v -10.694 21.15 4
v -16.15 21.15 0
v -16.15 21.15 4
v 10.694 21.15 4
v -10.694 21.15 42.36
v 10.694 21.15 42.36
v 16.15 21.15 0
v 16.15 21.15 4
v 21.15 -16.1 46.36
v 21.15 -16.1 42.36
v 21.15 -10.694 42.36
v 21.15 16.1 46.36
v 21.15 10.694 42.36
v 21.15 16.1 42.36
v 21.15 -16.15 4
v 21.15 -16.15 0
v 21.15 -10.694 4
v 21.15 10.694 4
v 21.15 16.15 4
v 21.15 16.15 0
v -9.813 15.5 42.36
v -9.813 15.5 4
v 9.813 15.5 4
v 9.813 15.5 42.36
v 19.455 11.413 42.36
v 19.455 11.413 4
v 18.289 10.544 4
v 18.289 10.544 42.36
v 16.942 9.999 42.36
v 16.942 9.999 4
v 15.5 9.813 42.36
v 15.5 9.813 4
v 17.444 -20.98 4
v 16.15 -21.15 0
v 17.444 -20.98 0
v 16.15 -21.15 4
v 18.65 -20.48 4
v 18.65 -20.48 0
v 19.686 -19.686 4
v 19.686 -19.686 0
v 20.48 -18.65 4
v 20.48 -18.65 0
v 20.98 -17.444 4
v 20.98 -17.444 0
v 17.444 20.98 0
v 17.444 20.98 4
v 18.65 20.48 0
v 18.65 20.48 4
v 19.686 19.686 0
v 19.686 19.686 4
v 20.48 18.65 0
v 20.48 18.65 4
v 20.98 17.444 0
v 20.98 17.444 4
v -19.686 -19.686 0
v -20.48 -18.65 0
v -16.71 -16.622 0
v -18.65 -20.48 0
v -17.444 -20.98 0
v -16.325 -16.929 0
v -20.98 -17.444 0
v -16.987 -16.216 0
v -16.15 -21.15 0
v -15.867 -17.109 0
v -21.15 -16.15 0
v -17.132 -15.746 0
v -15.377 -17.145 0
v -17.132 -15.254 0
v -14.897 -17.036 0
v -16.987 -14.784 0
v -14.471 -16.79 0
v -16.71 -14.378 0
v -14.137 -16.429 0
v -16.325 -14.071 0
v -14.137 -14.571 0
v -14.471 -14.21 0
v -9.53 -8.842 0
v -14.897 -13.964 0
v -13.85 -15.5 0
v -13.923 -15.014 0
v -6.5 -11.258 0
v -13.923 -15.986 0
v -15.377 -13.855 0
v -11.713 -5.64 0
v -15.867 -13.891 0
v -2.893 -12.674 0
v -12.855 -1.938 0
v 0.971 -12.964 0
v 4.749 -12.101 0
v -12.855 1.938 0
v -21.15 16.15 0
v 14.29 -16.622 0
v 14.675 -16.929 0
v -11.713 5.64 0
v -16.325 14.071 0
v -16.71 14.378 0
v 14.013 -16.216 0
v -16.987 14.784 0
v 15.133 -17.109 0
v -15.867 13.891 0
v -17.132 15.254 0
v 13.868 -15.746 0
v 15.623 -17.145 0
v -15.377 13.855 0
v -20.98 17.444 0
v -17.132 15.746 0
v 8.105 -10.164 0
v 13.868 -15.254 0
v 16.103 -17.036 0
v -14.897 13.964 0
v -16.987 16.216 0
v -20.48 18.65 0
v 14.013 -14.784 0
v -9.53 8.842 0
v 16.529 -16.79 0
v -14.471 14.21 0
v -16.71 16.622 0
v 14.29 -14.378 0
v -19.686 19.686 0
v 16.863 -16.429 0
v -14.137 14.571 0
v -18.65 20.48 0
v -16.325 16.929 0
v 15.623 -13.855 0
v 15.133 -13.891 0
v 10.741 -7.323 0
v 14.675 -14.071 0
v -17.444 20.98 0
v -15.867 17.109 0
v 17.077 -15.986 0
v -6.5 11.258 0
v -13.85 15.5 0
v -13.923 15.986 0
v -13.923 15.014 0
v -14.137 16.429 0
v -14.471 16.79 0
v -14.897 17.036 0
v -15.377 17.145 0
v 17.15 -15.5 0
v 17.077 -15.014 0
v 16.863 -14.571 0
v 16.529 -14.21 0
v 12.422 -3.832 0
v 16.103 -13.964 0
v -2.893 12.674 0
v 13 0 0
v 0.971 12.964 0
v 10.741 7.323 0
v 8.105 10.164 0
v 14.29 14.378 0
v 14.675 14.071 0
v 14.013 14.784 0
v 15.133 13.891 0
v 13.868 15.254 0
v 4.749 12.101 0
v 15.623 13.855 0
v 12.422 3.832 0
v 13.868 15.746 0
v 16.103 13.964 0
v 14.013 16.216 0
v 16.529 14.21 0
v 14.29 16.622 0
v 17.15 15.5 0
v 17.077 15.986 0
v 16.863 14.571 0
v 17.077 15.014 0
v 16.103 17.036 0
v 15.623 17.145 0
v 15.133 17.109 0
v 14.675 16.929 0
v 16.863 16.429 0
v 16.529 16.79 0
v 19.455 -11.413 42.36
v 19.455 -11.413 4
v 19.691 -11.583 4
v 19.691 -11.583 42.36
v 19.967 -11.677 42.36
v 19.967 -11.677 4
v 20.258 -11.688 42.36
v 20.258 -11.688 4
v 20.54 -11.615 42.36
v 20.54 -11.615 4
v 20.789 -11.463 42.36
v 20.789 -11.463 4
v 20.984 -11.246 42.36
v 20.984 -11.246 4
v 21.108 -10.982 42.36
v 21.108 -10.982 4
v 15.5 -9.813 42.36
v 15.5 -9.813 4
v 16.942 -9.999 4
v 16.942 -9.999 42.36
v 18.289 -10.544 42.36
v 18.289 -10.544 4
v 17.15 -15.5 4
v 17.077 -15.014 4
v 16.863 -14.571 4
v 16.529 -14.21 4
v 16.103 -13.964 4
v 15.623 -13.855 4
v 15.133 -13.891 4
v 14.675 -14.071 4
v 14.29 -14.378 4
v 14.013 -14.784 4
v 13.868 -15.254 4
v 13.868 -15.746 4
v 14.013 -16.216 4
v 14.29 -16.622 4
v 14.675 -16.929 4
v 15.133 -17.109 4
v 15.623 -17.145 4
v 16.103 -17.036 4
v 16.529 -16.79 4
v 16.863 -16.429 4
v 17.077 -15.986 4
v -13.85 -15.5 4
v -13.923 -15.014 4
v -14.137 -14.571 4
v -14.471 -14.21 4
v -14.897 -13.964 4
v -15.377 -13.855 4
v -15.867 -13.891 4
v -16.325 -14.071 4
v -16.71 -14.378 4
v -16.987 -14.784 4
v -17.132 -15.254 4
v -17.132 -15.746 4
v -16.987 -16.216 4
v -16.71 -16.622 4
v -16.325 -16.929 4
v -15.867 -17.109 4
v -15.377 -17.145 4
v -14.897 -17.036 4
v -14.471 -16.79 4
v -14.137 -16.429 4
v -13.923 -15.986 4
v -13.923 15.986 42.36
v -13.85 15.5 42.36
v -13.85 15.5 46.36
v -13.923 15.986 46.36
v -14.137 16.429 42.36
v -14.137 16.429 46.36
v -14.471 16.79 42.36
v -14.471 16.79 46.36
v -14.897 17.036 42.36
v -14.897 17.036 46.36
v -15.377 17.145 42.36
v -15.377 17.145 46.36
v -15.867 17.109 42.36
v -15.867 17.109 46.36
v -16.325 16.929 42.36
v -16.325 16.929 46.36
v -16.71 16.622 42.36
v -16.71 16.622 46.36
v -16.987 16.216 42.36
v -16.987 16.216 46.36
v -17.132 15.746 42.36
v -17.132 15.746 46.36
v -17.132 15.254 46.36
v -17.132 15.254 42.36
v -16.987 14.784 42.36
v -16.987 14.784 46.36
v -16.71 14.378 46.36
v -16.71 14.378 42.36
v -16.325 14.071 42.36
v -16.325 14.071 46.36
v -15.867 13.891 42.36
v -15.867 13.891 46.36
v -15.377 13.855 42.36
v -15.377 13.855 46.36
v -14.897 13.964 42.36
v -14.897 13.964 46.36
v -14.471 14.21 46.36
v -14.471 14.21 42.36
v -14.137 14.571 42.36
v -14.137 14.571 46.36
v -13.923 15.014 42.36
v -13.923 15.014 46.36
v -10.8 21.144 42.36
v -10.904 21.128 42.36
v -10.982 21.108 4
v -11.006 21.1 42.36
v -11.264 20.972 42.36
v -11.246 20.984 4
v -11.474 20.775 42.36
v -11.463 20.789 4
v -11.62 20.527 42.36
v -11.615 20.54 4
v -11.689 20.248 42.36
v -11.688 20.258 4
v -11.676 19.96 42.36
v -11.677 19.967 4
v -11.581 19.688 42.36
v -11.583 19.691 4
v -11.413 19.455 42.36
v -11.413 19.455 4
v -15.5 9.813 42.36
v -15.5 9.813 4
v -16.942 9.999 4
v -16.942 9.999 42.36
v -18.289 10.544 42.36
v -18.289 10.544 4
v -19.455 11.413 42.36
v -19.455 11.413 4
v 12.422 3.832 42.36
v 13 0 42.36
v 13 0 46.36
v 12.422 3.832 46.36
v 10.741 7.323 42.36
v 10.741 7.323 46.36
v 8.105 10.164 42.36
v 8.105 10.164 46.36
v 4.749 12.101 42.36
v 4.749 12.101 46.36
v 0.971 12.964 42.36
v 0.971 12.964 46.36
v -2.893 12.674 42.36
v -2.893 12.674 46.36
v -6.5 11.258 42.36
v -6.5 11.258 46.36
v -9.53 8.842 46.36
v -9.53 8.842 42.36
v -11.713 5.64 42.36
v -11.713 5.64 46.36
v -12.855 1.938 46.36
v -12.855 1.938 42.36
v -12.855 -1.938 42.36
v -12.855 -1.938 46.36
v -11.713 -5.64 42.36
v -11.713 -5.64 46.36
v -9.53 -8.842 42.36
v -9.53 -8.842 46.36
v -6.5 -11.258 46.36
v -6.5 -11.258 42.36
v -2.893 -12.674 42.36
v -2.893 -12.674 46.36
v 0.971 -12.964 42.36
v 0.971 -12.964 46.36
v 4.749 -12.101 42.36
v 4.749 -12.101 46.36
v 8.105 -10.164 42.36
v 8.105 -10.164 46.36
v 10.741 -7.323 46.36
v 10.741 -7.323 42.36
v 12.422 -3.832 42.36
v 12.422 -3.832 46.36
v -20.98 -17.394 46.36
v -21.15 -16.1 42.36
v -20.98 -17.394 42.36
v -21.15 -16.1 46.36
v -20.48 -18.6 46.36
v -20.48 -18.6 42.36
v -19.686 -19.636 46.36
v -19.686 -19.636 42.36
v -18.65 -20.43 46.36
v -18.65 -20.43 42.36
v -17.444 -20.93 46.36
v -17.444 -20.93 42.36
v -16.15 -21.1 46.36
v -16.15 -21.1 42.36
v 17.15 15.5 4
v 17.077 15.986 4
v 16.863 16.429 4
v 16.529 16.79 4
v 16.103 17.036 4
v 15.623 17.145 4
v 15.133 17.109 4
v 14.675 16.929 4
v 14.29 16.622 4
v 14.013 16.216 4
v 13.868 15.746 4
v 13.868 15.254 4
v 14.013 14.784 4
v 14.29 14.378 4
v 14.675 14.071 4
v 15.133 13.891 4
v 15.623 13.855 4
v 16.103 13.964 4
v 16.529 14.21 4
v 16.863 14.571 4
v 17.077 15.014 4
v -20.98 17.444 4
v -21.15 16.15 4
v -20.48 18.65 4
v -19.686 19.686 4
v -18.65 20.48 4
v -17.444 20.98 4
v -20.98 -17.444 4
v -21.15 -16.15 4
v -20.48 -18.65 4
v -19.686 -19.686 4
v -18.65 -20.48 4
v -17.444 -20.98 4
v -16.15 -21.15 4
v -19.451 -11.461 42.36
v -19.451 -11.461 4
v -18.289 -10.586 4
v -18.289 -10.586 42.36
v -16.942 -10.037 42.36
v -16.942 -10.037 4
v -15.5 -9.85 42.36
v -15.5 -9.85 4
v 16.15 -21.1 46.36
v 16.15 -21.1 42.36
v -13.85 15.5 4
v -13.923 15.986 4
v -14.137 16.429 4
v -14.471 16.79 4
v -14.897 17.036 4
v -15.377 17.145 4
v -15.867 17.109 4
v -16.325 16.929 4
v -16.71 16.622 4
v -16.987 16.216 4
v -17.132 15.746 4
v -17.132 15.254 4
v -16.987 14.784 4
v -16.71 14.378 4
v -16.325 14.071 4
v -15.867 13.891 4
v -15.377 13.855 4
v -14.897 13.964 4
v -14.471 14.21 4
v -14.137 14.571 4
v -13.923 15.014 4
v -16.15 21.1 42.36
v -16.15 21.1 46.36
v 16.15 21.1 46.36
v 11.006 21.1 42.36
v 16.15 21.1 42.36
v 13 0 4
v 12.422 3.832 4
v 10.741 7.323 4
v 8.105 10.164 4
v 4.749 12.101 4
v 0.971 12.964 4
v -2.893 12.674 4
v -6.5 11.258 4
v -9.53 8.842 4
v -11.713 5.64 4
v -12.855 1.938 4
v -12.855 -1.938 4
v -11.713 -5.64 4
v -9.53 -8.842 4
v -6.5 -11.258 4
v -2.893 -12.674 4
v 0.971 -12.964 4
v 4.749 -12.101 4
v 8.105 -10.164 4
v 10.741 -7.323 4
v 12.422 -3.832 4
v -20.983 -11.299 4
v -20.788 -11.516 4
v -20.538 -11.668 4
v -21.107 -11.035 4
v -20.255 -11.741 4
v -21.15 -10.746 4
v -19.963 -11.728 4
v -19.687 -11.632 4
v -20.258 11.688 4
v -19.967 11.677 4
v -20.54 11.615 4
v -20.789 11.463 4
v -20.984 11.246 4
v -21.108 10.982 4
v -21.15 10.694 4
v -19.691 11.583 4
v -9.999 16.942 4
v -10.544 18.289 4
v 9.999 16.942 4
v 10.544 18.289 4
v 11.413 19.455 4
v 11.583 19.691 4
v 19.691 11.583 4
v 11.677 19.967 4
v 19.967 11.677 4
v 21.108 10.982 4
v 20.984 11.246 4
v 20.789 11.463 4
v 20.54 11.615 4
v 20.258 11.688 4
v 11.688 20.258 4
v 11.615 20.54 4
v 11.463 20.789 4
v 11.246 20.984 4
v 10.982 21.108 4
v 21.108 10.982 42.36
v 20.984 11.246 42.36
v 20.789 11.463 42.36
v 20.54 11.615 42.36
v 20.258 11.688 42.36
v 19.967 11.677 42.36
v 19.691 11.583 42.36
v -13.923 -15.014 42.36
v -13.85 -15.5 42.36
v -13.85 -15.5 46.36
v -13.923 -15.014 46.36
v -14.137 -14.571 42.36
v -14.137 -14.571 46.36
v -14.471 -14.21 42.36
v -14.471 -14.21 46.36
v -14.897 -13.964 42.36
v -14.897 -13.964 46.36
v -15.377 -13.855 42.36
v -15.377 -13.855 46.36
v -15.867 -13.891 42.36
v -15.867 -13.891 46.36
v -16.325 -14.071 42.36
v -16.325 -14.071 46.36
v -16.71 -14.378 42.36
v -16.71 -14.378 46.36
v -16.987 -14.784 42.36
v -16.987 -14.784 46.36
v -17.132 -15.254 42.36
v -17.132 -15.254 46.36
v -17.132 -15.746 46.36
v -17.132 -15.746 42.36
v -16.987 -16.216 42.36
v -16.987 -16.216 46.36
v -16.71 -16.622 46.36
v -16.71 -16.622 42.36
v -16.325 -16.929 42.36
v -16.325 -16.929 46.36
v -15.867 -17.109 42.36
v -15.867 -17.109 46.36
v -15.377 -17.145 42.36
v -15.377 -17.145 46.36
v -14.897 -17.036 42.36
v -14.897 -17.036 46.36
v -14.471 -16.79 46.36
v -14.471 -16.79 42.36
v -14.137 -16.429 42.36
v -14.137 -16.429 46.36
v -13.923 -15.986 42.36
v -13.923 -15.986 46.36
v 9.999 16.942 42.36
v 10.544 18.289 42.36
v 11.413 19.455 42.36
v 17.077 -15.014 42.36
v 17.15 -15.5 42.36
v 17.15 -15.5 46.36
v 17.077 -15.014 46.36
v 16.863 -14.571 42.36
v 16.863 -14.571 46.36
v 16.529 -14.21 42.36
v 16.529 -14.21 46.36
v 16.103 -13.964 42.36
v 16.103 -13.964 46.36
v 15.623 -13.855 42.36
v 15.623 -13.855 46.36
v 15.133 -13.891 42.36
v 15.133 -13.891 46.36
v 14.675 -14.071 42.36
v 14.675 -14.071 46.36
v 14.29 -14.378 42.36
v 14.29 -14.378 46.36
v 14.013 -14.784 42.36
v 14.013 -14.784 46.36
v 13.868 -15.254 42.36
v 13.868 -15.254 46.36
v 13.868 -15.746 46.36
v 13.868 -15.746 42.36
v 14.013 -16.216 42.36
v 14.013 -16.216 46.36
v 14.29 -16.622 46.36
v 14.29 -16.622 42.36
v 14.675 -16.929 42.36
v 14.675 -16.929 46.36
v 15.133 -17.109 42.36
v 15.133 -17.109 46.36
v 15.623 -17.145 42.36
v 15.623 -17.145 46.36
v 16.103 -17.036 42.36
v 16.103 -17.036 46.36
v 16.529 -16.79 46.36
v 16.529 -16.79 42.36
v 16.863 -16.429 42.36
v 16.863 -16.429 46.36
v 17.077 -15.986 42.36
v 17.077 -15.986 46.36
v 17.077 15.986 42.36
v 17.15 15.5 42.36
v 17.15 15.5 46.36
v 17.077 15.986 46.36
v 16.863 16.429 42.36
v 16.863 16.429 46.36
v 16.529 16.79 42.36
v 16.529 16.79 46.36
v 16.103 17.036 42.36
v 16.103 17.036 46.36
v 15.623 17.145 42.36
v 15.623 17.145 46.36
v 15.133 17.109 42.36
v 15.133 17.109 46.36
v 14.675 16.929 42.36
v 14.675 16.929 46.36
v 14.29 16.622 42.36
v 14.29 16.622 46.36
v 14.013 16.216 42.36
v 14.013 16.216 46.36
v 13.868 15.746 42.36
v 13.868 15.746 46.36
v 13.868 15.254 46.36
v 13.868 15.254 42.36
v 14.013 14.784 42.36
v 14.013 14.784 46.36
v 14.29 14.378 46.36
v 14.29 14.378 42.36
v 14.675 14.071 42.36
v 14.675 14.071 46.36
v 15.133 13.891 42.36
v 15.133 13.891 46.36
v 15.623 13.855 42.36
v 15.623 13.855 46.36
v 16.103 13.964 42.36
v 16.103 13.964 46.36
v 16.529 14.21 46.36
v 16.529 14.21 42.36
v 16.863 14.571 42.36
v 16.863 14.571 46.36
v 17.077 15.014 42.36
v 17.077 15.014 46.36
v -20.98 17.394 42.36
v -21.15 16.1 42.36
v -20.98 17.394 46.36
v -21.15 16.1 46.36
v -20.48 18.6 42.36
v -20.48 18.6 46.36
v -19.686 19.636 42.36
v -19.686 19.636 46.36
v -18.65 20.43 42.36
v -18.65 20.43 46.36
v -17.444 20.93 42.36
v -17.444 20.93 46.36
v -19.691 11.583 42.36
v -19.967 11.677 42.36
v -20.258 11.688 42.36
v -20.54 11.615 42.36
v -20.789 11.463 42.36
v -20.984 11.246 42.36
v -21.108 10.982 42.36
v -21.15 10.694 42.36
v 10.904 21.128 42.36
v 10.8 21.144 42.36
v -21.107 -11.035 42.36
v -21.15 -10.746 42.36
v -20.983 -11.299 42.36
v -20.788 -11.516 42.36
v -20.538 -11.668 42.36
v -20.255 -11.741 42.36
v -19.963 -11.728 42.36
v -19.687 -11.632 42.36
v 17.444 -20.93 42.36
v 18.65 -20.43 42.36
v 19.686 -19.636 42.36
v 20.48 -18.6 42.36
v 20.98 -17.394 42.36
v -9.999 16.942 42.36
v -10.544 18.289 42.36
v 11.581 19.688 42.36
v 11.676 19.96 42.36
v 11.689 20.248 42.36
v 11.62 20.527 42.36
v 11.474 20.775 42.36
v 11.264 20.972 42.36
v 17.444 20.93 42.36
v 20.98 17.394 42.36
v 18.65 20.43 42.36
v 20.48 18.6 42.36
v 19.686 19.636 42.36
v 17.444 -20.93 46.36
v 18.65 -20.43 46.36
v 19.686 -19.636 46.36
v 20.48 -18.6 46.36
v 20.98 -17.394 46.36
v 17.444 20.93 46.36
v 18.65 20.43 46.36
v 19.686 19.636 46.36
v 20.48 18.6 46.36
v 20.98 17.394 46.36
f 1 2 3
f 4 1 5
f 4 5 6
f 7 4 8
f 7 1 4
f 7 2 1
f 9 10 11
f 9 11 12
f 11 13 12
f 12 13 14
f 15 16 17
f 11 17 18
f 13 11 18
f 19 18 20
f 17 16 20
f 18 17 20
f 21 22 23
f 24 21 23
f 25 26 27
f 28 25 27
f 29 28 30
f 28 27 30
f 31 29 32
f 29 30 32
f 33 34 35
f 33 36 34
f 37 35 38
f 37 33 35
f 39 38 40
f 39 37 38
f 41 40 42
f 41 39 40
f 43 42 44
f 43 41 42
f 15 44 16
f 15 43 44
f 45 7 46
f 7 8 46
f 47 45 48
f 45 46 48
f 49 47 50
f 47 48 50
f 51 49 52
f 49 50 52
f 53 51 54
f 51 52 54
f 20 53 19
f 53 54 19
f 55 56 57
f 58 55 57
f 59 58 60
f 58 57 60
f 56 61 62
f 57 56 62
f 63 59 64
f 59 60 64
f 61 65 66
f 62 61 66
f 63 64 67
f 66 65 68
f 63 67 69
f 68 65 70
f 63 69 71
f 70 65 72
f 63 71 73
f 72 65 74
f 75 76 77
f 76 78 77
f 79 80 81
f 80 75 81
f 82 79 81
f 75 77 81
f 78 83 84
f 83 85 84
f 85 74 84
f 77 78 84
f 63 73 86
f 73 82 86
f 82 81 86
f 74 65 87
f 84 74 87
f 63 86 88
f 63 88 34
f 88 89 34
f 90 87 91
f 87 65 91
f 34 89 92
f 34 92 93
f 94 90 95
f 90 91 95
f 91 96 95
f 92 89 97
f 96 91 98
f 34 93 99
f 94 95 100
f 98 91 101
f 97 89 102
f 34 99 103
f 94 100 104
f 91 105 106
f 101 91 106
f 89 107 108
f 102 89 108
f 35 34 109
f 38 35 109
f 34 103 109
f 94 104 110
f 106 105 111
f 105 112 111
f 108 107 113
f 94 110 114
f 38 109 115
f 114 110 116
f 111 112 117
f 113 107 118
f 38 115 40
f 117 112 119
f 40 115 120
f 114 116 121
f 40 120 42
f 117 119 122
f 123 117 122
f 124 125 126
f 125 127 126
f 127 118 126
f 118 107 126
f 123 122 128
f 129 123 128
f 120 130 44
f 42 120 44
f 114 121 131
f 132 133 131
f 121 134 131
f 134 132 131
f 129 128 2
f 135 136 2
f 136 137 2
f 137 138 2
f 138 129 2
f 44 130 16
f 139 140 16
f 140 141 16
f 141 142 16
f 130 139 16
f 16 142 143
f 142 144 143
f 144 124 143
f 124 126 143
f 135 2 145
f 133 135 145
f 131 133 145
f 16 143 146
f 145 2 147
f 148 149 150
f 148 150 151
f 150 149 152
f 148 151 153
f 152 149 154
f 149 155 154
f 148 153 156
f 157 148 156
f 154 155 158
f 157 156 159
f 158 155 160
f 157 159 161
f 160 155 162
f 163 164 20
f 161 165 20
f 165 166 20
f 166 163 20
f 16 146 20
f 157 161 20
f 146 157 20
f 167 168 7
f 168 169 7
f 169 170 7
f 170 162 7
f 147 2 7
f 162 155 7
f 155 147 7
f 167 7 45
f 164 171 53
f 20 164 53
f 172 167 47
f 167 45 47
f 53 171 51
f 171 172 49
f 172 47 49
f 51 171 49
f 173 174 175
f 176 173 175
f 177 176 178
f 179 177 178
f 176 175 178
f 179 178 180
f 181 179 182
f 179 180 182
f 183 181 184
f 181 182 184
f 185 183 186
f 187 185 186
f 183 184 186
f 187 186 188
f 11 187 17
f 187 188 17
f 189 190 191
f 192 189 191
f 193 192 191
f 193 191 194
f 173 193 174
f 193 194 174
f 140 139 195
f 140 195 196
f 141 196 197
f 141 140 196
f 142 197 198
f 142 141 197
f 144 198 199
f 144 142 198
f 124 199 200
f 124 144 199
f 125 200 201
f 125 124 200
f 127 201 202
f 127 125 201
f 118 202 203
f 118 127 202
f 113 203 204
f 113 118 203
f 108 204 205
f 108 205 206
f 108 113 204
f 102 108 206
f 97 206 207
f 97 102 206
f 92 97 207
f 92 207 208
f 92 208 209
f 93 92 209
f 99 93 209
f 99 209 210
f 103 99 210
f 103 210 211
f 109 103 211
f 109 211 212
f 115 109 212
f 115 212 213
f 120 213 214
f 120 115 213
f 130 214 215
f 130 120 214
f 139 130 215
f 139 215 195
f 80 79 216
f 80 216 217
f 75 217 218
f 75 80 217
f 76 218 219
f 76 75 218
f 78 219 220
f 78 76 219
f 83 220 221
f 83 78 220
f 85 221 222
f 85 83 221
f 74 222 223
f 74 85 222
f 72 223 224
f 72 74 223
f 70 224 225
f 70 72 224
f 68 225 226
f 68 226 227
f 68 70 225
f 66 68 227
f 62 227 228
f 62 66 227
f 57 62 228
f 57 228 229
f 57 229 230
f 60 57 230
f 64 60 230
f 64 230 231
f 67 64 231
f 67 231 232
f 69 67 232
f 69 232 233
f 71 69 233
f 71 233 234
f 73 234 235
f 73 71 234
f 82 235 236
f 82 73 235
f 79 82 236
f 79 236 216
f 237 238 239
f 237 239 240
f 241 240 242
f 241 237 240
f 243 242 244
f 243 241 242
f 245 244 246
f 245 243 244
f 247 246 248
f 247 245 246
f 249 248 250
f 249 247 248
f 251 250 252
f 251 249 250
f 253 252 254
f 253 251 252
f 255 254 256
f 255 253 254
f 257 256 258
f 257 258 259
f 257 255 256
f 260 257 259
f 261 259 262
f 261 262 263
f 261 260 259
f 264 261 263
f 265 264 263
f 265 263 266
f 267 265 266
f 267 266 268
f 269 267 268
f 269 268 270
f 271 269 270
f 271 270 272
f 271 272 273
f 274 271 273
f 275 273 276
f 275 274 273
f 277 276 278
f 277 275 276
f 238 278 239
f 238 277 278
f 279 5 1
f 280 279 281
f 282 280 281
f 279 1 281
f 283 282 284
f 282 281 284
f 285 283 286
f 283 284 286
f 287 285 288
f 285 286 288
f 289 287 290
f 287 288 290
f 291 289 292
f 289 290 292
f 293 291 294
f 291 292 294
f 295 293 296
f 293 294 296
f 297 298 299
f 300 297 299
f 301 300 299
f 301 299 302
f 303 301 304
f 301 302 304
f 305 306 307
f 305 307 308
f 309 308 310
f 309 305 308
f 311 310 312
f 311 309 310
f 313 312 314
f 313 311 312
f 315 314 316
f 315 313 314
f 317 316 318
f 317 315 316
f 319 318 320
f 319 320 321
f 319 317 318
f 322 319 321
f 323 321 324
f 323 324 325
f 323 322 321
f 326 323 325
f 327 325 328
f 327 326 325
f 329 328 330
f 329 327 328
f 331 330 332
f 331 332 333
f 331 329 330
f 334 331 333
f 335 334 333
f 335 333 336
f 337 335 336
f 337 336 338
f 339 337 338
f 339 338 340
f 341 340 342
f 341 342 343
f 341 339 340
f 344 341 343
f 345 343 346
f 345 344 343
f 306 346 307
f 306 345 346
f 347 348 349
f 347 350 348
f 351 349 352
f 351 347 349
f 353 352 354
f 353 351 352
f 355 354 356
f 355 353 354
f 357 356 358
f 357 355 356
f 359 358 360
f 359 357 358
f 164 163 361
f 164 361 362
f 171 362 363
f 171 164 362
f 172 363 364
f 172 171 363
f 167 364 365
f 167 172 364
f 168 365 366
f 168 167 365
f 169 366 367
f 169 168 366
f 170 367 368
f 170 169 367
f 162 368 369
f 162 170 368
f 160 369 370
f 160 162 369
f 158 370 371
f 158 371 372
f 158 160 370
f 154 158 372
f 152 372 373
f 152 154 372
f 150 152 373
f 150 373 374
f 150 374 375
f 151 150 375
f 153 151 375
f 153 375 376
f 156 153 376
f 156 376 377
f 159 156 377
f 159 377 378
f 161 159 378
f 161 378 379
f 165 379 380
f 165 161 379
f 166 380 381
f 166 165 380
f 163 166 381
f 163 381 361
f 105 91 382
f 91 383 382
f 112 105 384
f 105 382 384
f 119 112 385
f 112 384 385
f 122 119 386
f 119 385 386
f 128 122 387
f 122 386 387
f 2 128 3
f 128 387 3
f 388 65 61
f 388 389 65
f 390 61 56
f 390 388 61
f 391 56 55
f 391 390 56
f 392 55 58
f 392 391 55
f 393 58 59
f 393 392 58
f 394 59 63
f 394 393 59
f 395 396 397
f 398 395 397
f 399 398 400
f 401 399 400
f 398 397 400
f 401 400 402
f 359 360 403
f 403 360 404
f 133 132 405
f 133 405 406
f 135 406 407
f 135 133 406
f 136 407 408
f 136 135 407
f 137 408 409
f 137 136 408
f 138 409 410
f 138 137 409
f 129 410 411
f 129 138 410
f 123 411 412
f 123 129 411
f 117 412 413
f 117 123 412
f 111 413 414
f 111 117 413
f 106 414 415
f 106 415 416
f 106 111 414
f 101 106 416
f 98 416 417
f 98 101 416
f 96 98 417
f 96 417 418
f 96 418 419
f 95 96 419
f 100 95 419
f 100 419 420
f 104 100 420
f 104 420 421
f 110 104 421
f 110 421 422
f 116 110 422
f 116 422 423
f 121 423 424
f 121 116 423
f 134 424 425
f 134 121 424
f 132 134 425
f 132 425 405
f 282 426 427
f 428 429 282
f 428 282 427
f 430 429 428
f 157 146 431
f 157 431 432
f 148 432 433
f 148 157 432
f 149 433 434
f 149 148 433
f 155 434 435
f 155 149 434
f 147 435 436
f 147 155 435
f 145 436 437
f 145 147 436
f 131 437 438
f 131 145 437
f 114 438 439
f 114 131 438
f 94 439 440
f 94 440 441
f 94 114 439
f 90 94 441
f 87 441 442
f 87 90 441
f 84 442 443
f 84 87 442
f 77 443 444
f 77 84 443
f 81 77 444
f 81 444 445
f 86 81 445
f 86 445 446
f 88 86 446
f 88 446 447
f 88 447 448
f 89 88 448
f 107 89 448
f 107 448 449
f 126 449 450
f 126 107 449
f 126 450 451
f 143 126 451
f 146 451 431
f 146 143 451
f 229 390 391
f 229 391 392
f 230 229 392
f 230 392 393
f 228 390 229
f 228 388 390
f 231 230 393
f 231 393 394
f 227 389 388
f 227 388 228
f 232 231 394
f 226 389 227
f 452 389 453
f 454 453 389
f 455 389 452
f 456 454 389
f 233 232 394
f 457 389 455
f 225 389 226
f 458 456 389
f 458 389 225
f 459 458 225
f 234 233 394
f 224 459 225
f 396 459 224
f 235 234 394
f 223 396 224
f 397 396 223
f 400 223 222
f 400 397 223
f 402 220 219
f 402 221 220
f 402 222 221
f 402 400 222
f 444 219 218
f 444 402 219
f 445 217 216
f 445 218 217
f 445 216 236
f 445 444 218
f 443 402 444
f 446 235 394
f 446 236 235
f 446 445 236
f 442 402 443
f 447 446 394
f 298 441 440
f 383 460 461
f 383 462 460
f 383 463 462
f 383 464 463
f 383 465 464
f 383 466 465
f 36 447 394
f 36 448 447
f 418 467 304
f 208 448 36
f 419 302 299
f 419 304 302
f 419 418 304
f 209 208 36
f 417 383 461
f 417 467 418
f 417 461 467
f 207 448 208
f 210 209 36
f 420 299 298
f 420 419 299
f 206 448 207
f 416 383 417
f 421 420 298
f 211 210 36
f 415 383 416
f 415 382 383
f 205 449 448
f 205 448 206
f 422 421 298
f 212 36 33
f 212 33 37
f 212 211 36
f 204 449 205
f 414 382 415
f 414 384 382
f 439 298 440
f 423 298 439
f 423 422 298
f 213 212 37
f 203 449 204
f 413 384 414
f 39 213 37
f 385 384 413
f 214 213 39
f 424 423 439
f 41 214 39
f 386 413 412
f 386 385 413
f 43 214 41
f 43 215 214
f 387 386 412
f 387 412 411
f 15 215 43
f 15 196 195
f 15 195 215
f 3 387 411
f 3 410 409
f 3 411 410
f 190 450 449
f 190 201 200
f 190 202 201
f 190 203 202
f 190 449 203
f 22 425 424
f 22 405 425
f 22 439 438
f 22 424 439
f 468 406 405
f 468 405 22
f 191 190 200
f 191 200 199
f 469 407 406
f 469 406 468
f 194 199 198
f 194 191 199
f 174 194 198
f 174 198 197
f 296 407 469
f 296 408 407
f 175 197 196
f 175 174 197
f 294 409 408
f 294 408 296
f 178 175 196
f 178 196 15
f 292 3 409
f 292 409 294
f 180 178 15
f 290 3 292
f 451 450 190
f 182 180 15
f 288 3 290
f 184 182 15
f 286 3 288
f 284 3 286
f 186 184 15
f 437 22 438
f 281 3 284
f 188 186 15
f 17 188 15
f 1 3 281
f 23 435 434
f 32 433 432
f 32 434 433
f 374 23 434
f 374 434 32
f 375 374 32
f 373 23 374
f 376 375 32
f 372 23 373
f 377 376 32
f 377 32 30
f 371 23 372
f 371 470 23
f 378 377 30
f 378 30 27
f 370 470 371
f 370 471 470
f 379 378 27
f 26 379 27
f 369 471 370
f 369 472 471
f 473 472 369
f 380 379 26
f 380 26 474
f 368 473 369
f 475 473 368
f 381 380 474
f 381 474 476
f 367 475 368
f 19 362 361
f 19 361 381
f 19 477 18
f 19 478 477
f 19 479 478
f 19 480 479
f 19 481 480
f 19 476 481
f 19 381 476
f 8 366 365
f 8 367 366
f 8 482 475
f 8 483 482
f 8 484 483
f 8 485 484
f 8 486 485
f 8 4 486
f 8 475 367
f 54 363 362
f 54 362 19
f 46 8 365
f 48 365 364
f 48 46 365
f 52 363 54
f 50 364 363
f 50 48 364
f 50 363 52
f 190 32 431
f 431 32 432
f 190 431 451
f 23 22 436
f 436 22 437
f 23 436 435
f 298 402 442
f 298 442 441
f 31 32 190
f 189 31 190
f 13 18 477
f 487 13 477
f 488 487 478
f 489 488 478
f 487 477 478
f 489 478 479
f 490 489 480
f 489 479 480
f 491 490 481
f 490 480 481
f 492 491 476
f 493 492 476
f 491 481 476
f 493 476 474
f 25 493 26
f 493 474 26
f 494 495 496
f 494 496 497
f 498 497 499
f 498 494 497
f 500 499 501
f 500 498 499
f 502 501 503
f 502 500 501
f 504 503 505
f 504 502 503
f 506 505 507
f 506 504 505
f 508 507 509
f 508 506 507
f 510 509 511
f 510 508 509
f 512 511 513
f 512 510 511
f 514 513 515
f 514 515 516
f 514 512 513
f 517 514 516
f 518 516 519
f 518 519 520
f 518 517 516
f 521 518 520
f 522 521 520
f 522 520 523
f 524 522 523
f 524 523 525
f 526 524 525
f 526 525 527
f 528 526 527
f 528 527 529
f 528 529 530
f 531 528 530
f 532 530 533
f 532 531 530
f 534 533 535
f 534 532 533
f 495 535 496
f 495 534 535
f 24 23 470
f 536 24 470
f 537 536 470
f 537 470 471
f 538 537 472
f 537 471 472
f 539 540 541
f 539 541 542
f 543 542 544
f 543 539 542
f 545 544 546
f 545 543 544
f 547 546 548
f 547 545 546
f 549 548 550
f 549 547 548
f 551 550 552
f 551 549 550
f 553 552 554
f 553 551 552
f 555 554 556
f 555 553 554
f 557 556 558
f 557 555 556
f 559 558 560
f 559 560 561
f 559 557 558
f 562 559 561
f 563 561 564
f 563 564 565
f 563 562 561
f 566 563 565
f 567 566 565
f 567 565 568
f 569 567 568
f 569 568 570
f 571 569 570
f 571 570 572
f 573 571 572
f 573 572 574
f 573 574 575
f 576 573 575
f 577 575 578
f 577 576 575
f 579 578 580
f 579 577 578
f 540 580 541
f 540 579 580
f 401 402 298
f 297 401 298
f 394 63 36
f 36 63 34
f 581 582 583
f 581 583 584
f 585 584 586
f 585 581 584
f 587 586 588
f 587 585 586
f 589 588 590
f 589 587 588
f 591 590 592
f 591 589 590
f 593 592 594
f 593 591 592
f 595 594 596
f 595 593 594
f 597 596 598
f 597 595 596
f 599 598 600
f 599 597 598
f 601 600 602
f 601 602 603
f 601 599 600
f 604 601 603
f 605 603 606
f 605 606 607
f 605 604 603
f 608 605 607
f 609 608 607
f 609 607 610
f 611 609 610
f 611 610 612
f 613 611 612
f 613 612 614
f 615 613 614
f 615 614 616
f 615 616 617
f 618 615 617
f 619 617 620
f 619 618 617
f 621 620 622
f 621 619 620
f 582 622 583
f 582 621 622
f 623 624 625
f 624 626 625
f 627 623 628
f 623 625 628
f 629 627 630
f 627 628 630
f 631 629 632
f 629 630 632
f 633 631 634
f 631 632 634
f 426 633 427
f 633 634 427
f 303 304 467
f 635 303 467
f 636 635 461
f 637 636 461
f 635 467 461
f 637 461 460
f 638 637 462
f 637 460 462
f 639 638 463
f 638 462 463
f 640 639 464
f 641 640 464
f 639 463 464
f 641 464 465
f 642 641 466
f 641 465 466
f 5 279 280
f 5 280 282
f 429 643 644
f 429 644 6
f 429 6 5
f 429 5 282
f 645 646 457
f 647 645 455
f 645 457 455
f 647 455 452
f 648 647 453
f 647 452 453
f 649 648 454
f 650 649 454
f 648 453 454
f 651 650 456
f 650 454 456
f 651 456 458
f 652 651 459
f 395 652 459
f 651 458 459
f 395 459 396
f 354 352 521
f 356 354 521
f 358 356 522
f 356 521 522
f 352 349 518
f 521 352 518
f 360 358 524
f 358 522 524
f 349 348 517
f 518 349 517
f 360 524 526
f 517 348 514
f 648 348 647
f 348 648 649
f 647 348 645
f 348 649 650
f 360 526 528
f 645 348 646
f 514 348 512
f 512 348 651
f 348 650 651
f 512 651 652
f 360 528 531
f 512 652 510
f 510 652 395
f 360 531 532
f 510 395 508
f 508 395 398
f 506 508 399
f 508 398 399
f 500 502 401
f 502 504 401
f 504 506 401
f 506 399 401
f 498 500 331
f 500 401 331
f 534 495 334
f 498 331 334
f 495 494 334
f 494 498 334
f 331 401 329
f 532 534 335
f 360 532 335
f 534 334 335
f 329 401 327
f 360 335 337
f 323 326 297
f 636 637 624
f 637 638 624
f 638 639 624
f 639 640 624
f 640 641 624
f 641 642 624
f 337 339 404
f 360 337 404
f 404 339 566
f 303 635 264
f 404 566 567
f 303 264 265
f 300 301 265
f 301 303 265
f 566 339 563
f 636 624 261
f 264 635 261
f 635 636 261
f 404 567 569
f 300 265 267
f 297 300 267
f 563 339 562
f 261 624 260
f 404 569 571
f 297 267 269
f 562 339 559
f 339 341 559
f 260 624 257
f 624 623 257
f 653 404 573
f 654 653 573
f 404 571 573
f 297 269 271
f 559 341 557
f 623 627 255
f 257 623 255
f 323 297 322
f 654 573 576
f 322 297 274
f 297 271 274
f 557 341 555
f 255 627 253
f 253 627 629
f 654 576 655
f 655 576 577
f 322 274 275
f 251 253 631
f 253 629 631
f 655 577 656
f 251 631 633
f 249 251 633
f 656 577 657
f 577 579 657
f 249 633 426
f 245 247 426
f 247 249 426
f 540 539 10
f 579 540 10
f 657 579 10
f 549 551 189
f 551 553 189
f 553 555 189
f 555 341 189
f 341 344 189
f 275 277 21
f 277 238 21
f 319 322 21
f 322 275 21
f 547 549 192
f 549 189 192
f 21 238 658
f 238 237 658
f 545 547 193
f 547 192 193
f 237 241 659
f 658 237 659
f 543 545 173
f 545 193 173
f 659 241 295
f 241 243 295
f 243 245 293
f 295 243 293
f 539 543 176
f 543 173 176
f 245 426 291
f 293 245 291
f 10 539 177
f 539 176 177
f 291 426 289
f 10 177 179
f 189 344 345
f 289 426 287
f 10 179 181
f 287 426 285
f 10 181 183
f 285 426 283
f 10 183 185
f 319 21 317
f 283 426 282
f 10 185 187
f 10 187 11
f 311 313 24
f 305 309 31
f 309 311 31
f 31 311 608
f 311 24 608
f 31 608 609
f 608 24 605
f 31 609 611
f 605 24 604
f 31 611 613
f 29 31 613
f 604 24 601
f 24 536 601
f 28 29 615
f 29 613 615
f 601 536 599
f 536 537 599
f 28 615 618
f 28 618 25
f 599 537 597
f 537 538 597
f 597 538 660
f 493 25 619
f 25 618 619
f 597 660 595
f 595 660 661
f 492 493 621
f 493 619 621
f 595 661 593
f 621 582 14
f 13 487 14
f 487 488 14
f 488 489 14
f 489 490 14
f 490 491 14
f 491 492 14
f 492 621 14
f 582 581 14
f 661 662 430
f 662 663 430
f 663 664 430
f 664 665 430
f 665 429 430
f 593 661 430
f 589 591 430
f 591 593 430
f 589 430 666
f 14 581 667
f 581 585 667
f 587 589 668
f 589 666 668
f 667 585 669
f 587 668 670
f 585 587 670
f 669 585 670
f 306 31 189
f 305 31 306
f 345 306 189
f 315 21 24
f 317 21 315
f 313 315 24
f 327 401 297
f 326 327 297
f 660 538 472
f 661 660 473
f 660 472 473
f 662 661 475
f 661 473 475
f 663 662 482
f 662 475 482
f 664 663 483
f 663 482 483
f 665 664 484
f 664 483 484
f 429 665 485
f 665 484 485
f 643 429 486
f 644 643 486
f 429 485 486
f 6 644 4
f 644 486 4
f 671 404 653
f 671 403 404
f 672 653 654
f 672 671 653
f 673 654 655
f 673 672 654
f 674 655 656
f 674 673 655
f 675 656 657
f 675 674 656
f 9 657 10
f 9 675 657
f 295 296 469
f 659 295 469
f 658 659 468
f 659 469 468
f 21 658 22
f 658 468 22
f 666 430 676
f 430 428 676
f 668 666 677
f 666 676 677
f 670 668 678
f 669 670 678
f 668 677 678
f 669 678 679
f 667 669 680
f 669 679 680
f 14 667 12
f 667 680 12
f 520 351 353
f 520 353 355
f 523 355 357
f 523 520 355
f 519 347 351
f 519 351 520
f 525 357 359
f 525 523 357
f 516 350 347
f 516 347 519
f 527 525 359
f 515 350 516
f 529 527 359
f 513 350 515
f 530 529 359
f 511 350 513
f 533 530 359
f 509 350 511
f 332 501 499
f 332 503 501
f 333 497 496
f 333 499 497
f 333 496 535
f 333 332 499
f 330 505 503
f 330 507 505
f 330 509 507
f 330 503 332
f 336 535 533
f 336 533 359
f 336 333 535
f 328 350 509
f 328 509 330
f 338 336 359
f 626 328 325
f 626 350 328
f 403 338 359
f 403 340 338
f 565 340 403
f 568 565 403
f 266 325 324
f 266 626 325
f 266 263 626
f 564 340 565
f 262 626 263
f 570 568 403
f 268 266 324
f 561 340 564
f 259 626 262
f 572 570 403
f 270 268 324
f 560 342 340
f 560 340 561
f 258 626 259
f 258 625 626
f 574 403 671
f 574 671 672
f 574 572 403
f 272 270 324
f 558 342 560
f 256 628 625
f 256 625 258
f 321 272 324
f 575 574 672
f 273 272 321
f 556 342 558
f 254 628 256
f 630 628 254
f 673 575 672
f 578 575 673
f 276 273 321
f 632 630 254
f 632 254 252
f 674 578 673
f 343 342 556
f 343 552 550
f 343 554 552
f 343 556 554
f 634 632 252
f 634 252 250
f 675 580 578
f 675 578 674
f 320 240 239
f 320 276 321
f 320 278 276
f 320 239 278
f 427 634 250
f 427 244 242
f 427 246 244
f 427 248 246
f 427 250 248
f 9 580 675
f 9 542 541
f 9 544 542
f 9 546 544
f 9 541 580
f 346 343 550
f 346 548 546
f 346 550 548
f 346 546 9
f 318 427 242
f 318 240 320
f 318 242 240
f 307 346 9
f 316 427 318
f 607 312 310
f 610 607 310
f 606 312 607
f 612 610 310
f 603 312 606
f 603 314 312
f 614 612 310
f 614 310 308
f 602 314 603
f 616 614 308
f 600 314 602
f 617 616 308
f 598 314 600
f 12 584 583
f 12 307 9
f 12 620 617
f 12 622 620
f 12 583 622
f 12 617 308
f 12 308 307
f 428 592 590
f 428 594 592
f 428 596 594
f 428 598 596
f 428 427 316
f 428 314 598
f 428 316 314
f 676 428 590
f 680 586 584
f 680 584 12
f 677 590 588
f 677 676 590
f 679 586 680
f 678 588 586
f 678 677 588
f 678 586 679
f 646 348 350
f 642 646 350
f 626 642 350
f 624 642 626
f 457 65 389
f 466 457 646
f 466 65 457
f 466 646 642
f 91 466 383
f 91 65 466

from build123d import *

# Parameters (mm, degrees)
F0_W     = 42.3
F0_H     = 42.3
F0_R     = 1.65
F0_R_2   = 13
F1_DEPTH = 4
F2_R     = 5
F4_DEPTH = 38.36
F5_W     = 42.3
F5_H     = 42.200226
F5_R     = 1.65
F5_R_2   = 13
F6_DEPTH = 4
F7_R     = 5


with BuildPart() as f1:
    # F0 (on Top) → F1 (new body)
    with BuildSketch(Plane.XY):
        Rectangle(F0_W, F0_H)
        with Locations((-15.5, -15.5)):
            Circle(F0_R, mode=Mode.SUBTRACT)
        with Locations((15.5, -15.5)):
            Circle(F0_R, mode=Mode.SUBTRACT)
        with Locations((-15.5, 15.5)):
            Circle(F0_R, mode=Mode.SUBTRACT)
        Circle(F0_R_2, mode=Mode.SUBTRACT)
        with Locations((15.5, 15.5)):
            Circle(F0_R, mode=Mode.SUBTRACT)
    extrude(amount=F1_DEPTH)

    # F2
    f2_edges = [f1.edges().sort_by_distance(p)[0] for p in [
        (-21.15, -21.15, 2),
        (21.15, -21.15, 2),
        (-21.15, 21.15, 2),
        (21.15, 21.15, 2),
    ]]
    fillet(f2_edges, radius=F2_R)

    # F3 (on face) → F4 (join)
    with BuildSketch(Plane.XY.offset(4)):
        with BuildLine():
            ThreePointArc((-15.5, 9.812734), (-17.633029, 10.227886), (-19.454649, 11.412733))
            ThreePointArc((-19.454649, 11.412733), (-20.540287, 11.614756), (-21.15, 10.694063))
            Line((-21.15, 10.694063), (-21.15, -10.746054))
            ThreePointArc((-21.15, -10.746054), (-20.537783, -11.667805), (-19.450752, -11.460933))
            ThreePointArc((-19.450752, -11.460933), (-17.633281, -10.268211), (-15.5, -9.85))
            Line((-15.5, -9.85), (-15.5, 9.812734))
        make_face()
        with BuildLine():
            ThreePointArc((9.812734, 15.5), (10.227886, 17.633029), (11.412733, 19.454649))
            ThreePointArc((11.412733, 19.454649), (11.614756, 20.540287), (10.694063, 21.15))
            Line((10.694063, 21.15), (-10.694063, 21.15))
            ThreePointArc((-10.694063, 21.15), (-11.614756, 20.540287), (-11.412733, 19.454649))
            ThreePointArc((-11.412733, 19.454649), (-10.227886, 17.633029), (-9.812734, 15.5))
            Line((-9.812734, 15.5), (9.812734, 15.5))
        make_face()
        with BuildLine():
            ThreePointArc((15.5, -9.812734), (17.633029, -10.227886), (19.454649, -11.412733))
            ThreePointArc((19.454649, -11.412733), (20.540287, -11.614756), (21.15, -10.694063))
            Line((21.15, -10.694063), (21.15, 10.694063))
            ThreePointArc((21.15, 10.694063), (20.540287, 11.614756), (19.454649, 11.412733))
            ThreePointArc((19.454649, 11.412733), (17.633029, 10.227886), (15.5, 9.812734))
            Line((15.5, 9.812734), (15.5, -9.812734))
        make_face()
    extrude(amount=F4_DEPTH)

    # F5 (on face) → F6 (join)
    with BuildSketch(Plane.XY.offset(42.36)):
        Rectangle(F5_W, F5_H)
        with Locations((-15.5, -15.5)):
            Circle(F5_R, mode=Mode.SUBTRACT)
        with Locations((15.5, -15.5)):
            Circle(F5_R, mode=Mode.SUBTRACT)
        with Locations((-15.5, 15.5)):
            Circle(F5_R, mode=Mode.SUBTRACT)
        Circle(F5_R_2, mode=Mode.SUBTRACT)
        with Locations((15.5, 15.5)):
            Circle(F5_R, mode=Mode.SUBTRACT)
    extrude(amount=F6_DEPTH)

    # F7
    f7_edges = [f1.edges().sort_by_distance(p)[0] for p in [
        (-21.15, -21.100113, 44.36),
        (21.15, -21.100113, 44.36),
        (-21.15, 21.100113, 44.36),
        (21.15, 21.100113, 44.36),
    ]]
    fillet(f7_edges, radius=F7_R)


solid = f1.part
